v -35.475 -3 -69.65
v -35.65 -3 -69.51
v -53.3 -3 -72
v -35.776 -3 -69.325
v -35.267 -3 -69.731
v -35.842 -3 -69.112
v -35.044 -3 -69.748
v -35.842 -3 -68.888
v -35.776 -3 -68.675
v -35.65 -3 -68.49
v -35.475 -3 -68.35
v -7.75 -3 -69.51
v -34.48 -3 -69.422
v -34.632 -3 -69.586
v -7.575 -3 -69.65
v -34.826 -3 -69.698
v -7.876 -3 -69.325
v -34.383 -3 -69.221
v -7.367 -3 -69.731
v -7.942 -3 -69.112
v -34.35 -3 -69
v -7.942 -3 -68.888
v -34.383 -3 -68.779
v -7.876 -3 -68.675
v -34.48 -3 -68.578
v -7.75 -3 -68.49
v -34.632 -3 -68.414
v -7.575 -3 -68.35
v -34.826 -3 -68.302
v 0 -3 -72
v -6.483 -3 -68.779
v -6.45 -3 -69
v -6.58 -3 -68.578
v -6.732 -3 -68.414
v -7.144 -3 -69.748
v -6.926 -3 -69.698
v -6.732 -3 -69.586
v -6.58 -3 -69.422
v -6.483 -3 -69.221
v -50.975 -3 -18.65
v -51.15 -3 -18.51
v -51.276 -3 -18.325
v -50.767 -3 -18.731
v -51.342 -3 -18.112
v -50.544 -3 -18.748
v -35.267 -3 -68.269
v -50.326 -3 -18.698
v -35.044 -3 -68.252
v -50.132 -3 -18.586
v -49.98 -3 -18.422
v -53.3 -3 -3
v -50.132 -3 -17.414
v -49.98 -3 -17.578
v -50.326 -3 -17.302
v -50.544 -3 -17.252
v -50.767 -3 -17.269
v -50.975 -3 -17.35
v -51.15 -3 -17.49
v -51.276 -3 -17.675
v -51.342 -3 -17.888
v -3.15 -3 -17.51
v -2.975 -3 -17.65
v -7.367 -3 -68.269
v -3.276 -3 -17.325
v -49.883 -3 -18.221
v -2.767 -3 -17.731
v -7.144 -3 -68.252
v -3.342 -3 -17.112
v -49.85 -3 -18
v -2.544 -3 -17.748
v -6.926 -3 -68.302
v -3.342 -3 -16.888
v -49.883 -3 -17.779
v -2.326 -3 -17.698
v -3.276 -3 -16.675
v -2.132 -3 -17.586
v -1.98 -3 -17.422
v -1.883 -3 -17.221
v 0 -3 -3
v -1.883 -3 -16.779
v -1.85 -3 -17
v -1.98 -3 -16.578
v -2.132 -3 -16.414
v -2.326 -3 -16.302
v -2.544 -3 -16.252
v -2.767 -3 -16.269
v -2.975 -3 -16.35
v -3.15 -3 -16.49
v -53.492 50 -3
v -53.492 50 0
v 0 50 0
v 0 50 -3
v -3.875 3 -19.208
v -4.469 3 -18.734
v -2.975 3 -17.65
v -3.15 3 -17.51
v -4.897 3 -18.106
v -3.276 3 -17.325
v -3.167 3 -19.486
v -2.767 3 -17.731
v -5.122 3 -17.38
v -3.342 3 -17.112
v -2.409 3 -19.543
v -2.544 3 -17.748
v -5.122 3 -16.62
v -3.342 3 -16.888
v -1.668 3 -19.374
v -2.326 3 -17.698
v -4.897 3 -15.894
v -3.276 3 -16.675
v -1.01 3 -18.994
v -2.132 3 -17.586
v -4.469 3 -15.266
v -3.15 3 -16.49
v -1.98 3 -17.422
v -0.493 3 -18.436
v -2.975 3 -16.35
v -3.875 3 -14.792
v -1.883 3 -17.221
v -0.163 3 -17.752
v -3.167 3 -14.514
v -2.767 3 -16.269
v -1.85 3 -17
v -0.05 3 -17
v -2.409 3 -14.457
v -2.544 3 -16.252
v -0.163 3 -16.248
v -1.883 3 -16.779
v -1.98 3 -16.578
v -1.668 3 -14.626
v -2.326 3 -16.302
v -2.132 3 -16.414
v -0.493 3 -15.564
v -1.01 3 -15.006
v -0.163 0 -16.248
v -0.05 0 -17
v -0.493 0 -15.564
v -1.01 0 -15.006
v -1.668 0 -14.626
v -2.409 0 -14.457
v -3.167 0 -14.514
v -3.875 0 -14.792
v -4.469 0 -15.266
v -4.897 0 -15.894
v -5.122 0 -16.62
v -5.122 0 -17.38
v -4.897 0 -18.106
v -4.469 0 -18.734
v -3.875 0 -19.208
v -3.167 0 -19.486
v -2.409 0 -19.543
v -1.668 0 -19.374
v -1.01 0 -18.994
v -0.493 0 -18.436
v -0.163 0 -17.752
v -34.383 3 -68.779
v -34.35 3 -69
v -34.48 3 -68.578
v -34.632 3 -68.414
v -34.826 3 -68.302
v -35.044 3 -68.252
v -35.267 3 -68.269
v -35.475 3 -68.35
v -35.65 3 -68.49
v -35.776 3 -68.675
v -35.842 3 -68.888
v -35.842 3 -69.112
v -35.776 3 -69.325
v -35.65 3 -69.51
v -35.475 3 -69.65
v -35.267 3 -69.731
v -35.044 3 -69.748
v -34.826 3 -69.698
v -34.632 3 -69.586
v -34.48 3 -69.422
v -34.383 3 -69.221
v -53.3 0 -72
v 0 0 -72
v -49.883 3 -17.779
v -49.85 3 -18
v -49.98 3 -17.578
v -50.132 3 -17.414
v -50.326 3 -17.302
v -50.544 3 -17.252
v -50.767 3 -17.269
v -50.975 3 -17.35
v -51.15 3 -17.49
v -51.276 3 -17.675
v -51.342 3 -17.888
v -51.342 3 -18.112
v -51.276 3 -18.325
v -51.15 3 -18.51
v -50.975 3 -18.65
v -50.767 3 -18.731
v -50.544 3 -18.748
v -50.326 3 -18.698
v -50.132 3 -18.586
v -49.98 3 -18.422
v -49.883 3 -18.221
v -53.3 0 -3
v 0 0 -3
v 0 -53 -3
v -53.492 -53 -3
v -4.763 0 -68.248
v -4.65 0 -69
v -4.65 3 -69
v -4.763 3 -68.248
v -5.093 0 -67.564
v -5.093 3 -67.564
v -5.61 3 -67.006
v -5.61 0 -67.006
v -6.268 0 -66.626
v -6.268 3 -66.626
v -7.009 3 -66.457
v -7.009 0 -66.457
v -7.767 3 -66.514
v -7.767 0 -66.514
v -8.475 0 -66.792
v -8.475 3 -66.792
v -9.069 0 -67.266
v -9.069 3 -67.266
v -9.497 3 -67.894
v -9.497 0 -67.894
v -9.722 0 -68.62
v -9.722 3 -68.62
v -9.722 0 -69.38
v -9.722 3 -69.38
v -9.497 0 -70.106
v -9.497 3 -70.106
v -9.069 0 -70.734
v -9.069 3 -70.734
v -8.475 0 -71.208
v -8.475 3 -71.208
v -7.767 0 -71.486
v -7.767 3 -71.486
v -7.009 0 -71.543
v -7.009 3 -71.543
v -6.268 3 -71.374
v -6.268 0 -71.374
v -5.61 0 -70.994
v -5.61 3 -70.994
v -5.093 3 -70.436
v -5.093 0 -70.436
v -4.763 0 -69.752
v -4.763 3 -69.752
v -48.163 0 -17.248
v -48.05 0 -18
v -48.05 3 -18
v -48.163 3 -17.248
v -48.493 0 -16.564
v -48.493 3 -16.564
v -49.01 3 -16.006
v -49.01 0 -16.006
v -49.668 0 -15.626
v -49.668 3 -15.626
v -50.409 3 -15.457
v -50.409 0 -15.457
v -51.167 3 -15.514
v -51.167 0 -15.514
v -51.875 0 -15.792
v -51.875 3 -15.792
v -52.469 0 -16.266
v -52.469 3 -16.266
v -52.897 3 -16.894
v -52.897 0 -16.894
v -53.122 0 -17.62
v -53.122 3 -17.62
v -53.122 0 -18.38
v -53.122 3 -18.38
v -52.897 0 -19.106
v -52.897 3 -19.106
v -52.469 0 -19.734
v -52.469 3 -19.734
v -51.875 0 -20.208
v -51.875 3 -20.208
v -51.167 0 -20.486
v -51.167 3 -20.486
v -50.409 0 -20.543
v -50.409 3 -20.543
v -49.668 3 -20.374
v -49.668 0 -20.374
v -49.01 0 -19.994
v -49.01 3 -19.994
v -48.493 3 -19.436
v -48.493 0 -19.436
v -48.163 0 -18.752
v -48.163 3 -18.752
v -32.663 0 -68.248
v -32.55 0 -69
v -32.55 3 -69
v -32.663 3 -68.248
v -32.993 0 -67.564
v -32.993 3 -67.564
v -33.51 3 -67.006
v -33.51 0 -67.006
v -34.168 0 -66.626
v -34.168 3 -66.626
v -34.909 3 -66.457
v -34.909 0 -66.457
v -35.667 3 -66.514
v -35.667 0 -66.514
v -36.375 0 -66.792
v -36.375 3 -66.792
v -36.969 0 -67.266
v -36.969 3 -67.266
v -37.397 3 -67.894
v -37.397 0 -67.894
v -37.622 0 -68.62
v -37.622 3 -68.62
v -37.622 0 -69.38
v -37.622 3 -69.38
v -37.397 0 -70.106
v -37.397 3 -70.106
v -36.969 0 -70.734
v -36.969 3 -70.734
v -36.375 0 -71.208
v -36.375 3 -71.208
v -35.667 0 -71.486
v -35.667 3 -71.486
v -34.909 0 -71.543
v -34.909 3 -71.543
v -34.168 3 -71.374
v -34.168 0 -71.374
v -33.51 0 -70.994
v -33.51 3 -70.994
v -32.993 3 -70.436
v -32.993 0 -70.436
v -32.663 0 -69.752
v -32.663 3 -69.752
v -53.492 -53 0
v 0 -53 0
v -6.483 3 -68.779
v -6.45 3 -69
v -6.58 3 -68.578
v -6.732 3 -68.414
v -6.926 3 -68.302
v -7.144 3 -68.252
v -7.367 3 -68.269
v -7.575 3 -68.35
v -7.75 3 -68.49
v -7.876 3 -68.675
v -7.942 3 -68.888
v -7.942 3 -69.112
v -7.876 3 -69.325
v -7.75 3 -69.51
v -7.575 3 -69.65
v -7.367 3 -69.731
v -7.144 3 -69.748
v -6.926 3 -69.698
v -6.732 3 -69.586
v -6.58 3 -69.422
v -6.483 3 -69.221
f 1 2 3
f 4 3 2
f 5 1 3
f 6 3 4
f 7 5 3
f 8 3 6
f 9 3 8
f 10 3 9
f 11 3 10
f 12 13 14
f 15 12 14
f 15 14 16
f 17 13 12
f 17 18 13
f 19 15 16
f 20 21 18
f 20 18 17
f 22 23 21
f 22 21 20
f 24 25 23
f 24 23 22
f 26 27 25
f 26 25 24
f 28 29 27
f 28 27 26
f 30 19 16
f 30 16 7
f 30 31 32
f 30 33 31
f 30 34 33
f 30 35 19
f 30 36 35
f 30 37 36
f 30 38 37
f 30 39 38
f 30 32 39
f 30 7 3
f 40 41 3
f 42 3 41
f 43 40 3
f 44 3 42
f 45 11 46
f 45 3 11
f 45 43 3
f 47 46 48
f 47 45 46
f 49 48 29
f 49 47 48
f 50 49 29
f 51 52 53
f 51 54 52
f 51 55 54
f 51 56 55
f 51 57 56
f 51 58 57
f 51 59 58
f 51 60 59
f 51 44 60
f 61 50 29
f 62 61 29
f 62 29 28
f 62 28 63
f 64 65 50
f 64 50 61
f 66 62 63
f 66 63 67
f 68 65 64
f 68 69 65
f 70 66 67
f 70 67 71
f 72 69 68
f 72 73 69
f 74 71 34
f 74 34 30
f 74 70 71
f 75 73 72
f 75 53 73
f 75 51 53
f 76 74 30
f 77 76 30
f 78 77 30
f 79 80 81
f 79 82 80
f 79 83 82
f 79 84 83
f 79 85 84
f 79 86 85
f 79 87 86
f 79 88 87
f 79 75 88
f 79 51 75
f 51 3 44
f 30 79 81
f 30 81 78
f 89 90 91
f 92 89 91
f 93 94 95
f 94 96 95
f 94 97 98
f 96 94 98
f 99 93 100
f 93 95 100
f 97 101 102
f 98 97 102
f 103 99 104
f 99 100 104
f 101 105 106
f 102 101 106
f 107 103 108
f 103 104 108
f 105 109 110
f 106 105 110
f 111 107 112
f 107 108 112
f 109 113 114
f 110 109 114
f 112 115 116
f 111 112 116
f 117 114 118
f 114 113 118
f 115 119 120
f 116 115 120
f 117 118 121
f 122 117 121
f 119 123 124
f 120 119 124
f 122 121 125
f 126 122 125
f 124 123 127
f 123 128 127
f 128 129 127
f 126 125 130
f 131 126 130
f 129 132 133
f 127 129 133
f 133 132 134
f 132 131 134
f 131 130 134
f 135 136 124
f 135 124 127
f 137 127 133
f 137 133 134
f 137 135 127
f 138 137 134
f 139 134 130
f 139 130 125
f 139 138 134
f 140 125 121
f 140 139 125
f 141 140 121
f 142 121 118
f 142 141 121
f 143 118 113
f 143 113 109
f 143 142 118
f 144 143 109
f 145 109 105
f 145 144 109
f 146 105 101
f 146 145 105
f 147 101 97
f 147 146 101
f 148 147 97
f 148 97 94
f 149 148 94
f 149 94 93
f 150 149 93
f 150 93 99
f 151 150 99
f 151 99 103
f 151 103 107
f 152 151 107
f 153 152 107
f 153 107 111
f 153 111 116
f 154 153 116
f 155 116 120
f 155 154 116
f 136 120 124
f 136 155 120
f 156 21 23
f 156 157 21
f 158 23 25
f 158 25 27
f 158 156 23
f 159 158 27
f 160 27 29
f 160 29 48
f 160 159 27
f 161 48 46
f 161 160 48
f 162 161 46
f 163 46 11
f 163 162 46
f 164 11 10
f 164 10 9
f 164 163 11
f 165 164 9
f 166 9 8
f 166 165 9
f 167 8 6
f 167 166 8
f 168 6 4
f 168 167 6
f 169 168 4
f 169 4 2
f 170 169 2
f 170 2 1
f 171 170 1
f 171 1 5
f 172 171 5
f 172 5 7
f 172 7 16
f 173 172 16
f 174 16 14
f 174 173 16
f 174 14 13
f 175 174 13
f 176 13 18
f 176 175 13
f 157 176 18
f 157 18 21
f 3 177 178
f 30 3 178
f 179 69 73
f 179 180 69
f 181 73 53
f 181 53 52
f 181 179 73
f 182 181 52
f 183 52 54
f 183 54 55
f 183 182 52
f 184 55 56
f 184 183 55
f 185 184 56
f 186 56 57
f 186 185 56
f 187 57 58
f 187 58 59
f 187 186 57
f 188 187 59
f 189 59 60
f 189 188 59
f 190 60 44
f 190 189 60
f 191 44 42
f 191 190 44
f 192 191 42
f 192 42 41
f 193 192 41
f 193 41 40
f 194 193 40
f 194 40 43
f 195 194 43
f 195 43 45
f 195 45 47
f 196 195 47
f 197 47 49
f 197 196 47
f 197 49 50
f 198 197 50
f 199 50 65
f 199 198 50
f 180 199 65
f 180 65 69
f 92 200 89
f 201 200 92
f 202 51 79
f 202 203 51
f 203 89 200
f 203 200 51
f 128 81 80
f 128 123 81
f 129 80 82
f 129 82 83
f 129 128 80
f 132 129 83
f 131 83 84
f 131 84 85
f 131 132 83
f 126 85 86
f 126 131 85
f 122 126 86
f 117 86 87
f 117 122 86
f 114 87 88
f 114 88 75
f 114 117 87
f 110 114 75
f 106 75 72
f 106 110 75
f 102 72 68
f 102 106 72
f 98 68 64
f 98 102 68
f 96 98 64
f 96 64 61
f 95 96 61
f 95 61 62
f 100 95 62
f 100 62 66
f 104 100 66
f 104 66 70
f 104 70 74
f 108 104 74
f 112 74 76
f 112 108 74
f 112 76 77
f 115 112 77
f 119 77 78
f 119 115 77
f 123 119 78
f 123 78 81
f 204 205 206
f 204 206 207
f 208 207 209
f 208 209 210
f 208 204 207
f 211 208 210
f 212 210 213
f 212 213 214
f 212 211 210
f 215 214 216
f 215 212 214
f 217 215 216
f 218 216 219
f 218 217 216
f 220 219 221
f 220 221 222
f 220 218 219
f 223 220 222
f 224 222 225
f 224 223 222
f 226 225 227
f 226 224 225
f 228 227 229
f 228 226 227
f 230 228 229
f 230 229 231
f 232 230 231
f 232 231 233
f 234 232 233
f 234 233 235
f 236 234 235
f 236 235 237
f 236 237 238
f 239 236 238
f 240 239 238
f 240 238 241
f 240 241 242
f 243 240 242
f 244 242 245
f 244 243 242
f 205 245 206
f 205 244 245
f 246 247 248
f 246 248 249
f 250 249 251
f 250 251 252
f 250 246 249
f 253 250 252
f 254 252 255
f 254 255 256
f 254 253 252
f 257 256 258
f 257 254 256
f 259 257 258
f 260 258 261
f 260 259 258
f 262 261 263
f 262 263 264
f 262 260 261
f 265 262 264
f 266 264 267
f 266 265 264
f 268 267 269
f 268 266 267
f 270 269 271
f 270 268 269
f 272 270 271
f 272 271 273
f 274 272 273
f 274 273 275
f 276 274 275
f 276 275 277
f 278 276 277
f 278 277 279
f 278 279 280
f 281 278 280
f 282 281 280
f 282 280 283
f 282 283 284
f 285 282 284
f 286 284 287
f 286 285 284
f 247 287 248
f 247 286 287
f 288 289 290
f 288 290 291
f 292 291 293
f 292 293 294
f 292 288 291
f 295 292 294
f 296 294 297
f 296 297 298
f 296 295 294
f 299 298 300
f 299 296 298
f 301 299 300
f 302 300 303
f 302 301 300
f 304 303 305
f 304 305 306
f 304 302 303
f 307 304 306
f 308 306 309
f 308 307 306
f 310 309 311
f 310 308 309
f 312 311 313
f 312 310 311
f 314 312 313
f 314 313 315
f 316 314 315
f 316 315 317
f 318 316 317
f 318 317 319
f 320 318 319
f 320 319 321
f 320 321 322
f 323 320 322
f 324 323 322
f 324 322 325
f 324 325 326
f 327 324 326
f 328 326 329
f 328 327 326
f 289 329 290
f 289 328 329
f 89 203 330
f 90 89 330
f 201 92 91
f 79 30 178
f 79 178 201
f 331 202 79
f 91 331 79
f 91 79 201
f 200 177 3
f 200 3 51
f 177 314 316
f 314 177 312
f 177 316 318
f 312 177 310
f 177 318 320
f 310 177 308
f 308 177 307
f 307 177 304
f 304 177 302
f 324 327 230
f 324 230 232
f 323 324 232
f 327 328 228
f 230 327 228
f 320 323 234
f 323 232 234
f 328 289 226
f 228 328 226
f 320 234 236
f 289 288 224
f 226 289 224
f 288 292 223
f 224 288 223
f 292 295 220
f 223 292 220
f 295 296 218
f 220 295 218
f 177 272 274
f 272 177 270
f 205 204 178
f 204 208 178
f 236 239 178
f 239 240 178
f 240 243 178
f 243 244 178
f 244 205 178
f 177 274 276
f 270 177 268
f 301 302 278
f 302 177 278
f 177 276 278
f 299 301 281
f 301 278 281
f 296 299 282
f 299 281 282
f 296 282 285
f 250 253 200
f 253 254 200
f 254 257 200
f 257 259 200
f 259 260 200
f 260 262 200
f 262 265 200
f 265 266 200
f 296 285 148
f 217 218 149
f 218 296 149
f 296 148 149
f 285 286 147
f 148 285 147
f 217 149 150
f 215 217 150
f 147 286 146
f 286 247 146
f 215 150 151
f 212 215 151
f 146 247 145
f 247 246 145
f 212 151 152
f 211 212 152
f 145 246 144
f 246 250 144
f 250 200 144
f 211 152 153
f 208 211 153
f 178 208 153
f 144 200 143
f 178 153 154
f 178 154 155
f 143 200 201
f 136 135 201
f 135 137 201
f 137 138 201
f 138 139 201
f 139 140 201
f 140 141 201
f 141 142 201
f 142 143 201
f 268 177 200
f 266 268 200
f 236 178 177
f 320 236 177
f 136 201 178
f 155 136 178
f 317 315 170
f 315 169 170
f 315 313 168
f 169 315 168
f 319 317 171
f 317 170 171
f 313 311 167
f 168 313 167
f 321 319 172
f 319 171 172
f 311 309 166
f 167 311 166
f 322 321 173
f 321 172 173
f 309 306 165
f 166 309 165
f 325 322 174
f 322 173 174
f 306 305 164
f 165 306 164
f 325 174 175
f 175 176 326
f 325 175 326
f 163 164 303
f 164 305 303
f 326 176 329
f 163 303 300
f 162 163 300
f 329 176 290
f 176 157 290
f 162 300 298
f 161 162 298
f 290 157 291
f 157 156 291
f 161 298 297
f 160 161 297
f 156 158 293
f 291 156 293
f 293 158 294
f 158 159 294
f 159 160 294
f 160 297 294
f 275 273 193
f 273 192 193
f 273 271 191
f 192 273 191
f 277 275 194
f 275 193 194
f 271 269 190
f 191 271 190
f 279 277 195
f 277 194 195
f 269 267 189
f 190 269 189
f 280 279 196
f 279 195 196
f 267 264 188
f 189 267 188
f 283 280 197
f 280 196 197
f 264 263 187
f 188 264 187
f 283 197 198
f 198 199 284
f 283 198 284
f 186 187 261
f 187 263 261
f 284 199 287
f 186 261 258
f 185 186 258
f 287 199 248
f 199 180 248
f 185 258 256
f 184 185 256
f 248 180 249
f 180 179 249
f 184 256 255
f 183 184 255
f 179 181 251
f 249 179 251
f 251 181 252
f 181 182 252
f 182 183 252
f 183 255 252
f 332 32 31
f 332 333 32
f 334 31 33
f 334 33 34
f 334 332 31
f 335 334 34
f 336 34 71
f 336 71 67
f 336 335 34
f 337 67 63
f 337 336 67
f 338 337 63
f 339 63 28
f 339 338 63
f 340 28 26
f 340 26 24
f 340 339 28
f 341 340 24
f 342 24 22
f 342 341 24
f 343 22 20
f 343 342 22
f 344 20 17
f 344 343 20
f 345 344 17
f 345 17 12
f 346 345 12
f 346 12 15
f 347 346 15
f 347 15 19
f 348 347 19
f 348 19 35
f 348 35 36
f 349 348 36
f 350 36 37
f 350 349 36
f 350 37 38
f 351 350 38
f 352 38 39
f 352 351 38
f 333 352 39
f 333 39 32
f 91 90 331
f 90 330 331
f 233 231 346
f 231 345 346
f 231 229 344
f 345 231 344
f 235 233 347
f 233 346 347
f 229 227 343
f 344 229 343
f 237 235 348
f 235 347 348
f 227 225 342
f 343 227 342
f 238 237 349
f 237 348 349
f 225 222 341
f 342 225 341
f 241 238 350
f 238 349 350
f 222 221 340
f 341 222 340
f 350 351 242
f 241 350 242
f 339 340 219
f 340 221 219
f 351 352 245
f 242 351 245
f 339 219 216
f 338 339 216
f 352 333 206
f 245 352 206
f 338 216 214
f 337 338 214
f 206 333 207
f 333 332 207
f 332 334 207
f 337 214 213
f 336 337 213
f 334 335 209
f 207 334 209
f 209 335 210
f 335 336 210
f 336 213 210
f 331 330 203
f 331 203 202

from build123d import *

# Parameters (mm, degrees)
F0_W     = 53.3
F0_H     = 72
F0_R     = 2.55
F0_R_2   = 0.75
F1_DEPTH = 3
F2_DEPTH = 3
F3_DEPTH = 3
F4_W     = 53.492
F4_H     = 3
F5_DEPTH = 53
F6_DEPTH = 50


with BuildPart() as f1:
    # F0 (on Front) → F1 (new body)
    with BuildSketch(Plane.XZ):
        with Locations((-26.65, -36)):
            Rectangle(F0_W, F0_H)
        with Locations((-35.1, -69)):
            Circle(F0_R, mode=Mode.SUBTRACT)
        with Locations((-7.2, -69)):
            Circle(F0_R, mode=Mode.SUBTRACT)
        with Locations((-50.6, -18)):
            Circle(F0_R, mode=Mode.SUBTRACT)
        with Locations((-2.6, -17)):
            Circle(F0_R, mode=Mode.SUBTRACT)
        with Locations((-50.6, -18)):
            Circle(F0_R)
        with Locations((-50.6, -18)):
            Circle(F0_R_2, mode=Mode.SUBTRACT)
        with Locations((-2.6, -17)):
            Circle(F0_R)
        with Locations((-2.6, -17)):
            Circle(F0_R_2, mode=Mode.SUBTRACT)
        with Locations((-7.2, -69)):
            Circle(F0_R)
        with Locations((-7.2, -69)):
            Circle(F0_R_2, mode=Mode.SUBTRACT)
        with Locations((-35.1, -69)):
            Circle(F0_R)
        with Locations((-35.1, -69)):
            Circle(F0_R_2, mode=Mode.SUBTRACT)
    extrude(amount=F1_DEPTH)

    # F0 (on Front) → F2 (join)
    with BuildSketch(Plane.XZ):
        with Locations((-50.6, -18)):
            Circle(F0_R)
        with Locations((-50.6, -18)):
            Circle(F0_R_2, mode=Mode.SUBTRACT)
        with Locations((-2.6, -17)):
            Circle(F0_R)
        with Locations((-2.6, -17)):
            Circle(F0_R_2, mode=Mode.SUBTRACT)
        with Locations((-7.2, -69)):
            Circle(F0_R)
        with Locations((-7.2, -69)):
            Circle(F0_R_2, mode=Mode.SUBTRACT)
        with Locations((-35.1, -69)):
            Circle(F0_R)
        with Locations((-35.1, -69)):
            Circle(F0_R_2, mode=Mode.SUBTRACT)
    extrude(amount=-F2_DEPTH)

    # F0 (on Front) → F3 (cut)
    with BuildSketch(Plane.XZ):
        with Locations((-2.6, -17)):
            Circle(F0_R_2)
        with Locations((-50.6, -18)):
            Circle(F0_R_2)
        with Locations((-35.1, -69)):
            Circle(F0_R_2)
        with Locations((-7.2, -69)):
            Circle(F0_R_2)
    extrude(amount=-F3_DEPTH, mode=Mode.SUBTRACT)

    # F4 (on Front) → F5 (join)
    with BuildSketch(Plane.XZ):
        with Locations((-26.746, -1.5)):
            Rectangle(F4_W, F4_H)
    extrude(amount=F5_DEPTH)

    # F4 (on Front) → F6 (join)
    with BuildSketch(Plane.XZ):
        with Locations((-26.746, -1.5)):
            Rectangle(F4_W, F4_H)
    extrude(amount=-F6_DEPTH)


solid = f1.part
